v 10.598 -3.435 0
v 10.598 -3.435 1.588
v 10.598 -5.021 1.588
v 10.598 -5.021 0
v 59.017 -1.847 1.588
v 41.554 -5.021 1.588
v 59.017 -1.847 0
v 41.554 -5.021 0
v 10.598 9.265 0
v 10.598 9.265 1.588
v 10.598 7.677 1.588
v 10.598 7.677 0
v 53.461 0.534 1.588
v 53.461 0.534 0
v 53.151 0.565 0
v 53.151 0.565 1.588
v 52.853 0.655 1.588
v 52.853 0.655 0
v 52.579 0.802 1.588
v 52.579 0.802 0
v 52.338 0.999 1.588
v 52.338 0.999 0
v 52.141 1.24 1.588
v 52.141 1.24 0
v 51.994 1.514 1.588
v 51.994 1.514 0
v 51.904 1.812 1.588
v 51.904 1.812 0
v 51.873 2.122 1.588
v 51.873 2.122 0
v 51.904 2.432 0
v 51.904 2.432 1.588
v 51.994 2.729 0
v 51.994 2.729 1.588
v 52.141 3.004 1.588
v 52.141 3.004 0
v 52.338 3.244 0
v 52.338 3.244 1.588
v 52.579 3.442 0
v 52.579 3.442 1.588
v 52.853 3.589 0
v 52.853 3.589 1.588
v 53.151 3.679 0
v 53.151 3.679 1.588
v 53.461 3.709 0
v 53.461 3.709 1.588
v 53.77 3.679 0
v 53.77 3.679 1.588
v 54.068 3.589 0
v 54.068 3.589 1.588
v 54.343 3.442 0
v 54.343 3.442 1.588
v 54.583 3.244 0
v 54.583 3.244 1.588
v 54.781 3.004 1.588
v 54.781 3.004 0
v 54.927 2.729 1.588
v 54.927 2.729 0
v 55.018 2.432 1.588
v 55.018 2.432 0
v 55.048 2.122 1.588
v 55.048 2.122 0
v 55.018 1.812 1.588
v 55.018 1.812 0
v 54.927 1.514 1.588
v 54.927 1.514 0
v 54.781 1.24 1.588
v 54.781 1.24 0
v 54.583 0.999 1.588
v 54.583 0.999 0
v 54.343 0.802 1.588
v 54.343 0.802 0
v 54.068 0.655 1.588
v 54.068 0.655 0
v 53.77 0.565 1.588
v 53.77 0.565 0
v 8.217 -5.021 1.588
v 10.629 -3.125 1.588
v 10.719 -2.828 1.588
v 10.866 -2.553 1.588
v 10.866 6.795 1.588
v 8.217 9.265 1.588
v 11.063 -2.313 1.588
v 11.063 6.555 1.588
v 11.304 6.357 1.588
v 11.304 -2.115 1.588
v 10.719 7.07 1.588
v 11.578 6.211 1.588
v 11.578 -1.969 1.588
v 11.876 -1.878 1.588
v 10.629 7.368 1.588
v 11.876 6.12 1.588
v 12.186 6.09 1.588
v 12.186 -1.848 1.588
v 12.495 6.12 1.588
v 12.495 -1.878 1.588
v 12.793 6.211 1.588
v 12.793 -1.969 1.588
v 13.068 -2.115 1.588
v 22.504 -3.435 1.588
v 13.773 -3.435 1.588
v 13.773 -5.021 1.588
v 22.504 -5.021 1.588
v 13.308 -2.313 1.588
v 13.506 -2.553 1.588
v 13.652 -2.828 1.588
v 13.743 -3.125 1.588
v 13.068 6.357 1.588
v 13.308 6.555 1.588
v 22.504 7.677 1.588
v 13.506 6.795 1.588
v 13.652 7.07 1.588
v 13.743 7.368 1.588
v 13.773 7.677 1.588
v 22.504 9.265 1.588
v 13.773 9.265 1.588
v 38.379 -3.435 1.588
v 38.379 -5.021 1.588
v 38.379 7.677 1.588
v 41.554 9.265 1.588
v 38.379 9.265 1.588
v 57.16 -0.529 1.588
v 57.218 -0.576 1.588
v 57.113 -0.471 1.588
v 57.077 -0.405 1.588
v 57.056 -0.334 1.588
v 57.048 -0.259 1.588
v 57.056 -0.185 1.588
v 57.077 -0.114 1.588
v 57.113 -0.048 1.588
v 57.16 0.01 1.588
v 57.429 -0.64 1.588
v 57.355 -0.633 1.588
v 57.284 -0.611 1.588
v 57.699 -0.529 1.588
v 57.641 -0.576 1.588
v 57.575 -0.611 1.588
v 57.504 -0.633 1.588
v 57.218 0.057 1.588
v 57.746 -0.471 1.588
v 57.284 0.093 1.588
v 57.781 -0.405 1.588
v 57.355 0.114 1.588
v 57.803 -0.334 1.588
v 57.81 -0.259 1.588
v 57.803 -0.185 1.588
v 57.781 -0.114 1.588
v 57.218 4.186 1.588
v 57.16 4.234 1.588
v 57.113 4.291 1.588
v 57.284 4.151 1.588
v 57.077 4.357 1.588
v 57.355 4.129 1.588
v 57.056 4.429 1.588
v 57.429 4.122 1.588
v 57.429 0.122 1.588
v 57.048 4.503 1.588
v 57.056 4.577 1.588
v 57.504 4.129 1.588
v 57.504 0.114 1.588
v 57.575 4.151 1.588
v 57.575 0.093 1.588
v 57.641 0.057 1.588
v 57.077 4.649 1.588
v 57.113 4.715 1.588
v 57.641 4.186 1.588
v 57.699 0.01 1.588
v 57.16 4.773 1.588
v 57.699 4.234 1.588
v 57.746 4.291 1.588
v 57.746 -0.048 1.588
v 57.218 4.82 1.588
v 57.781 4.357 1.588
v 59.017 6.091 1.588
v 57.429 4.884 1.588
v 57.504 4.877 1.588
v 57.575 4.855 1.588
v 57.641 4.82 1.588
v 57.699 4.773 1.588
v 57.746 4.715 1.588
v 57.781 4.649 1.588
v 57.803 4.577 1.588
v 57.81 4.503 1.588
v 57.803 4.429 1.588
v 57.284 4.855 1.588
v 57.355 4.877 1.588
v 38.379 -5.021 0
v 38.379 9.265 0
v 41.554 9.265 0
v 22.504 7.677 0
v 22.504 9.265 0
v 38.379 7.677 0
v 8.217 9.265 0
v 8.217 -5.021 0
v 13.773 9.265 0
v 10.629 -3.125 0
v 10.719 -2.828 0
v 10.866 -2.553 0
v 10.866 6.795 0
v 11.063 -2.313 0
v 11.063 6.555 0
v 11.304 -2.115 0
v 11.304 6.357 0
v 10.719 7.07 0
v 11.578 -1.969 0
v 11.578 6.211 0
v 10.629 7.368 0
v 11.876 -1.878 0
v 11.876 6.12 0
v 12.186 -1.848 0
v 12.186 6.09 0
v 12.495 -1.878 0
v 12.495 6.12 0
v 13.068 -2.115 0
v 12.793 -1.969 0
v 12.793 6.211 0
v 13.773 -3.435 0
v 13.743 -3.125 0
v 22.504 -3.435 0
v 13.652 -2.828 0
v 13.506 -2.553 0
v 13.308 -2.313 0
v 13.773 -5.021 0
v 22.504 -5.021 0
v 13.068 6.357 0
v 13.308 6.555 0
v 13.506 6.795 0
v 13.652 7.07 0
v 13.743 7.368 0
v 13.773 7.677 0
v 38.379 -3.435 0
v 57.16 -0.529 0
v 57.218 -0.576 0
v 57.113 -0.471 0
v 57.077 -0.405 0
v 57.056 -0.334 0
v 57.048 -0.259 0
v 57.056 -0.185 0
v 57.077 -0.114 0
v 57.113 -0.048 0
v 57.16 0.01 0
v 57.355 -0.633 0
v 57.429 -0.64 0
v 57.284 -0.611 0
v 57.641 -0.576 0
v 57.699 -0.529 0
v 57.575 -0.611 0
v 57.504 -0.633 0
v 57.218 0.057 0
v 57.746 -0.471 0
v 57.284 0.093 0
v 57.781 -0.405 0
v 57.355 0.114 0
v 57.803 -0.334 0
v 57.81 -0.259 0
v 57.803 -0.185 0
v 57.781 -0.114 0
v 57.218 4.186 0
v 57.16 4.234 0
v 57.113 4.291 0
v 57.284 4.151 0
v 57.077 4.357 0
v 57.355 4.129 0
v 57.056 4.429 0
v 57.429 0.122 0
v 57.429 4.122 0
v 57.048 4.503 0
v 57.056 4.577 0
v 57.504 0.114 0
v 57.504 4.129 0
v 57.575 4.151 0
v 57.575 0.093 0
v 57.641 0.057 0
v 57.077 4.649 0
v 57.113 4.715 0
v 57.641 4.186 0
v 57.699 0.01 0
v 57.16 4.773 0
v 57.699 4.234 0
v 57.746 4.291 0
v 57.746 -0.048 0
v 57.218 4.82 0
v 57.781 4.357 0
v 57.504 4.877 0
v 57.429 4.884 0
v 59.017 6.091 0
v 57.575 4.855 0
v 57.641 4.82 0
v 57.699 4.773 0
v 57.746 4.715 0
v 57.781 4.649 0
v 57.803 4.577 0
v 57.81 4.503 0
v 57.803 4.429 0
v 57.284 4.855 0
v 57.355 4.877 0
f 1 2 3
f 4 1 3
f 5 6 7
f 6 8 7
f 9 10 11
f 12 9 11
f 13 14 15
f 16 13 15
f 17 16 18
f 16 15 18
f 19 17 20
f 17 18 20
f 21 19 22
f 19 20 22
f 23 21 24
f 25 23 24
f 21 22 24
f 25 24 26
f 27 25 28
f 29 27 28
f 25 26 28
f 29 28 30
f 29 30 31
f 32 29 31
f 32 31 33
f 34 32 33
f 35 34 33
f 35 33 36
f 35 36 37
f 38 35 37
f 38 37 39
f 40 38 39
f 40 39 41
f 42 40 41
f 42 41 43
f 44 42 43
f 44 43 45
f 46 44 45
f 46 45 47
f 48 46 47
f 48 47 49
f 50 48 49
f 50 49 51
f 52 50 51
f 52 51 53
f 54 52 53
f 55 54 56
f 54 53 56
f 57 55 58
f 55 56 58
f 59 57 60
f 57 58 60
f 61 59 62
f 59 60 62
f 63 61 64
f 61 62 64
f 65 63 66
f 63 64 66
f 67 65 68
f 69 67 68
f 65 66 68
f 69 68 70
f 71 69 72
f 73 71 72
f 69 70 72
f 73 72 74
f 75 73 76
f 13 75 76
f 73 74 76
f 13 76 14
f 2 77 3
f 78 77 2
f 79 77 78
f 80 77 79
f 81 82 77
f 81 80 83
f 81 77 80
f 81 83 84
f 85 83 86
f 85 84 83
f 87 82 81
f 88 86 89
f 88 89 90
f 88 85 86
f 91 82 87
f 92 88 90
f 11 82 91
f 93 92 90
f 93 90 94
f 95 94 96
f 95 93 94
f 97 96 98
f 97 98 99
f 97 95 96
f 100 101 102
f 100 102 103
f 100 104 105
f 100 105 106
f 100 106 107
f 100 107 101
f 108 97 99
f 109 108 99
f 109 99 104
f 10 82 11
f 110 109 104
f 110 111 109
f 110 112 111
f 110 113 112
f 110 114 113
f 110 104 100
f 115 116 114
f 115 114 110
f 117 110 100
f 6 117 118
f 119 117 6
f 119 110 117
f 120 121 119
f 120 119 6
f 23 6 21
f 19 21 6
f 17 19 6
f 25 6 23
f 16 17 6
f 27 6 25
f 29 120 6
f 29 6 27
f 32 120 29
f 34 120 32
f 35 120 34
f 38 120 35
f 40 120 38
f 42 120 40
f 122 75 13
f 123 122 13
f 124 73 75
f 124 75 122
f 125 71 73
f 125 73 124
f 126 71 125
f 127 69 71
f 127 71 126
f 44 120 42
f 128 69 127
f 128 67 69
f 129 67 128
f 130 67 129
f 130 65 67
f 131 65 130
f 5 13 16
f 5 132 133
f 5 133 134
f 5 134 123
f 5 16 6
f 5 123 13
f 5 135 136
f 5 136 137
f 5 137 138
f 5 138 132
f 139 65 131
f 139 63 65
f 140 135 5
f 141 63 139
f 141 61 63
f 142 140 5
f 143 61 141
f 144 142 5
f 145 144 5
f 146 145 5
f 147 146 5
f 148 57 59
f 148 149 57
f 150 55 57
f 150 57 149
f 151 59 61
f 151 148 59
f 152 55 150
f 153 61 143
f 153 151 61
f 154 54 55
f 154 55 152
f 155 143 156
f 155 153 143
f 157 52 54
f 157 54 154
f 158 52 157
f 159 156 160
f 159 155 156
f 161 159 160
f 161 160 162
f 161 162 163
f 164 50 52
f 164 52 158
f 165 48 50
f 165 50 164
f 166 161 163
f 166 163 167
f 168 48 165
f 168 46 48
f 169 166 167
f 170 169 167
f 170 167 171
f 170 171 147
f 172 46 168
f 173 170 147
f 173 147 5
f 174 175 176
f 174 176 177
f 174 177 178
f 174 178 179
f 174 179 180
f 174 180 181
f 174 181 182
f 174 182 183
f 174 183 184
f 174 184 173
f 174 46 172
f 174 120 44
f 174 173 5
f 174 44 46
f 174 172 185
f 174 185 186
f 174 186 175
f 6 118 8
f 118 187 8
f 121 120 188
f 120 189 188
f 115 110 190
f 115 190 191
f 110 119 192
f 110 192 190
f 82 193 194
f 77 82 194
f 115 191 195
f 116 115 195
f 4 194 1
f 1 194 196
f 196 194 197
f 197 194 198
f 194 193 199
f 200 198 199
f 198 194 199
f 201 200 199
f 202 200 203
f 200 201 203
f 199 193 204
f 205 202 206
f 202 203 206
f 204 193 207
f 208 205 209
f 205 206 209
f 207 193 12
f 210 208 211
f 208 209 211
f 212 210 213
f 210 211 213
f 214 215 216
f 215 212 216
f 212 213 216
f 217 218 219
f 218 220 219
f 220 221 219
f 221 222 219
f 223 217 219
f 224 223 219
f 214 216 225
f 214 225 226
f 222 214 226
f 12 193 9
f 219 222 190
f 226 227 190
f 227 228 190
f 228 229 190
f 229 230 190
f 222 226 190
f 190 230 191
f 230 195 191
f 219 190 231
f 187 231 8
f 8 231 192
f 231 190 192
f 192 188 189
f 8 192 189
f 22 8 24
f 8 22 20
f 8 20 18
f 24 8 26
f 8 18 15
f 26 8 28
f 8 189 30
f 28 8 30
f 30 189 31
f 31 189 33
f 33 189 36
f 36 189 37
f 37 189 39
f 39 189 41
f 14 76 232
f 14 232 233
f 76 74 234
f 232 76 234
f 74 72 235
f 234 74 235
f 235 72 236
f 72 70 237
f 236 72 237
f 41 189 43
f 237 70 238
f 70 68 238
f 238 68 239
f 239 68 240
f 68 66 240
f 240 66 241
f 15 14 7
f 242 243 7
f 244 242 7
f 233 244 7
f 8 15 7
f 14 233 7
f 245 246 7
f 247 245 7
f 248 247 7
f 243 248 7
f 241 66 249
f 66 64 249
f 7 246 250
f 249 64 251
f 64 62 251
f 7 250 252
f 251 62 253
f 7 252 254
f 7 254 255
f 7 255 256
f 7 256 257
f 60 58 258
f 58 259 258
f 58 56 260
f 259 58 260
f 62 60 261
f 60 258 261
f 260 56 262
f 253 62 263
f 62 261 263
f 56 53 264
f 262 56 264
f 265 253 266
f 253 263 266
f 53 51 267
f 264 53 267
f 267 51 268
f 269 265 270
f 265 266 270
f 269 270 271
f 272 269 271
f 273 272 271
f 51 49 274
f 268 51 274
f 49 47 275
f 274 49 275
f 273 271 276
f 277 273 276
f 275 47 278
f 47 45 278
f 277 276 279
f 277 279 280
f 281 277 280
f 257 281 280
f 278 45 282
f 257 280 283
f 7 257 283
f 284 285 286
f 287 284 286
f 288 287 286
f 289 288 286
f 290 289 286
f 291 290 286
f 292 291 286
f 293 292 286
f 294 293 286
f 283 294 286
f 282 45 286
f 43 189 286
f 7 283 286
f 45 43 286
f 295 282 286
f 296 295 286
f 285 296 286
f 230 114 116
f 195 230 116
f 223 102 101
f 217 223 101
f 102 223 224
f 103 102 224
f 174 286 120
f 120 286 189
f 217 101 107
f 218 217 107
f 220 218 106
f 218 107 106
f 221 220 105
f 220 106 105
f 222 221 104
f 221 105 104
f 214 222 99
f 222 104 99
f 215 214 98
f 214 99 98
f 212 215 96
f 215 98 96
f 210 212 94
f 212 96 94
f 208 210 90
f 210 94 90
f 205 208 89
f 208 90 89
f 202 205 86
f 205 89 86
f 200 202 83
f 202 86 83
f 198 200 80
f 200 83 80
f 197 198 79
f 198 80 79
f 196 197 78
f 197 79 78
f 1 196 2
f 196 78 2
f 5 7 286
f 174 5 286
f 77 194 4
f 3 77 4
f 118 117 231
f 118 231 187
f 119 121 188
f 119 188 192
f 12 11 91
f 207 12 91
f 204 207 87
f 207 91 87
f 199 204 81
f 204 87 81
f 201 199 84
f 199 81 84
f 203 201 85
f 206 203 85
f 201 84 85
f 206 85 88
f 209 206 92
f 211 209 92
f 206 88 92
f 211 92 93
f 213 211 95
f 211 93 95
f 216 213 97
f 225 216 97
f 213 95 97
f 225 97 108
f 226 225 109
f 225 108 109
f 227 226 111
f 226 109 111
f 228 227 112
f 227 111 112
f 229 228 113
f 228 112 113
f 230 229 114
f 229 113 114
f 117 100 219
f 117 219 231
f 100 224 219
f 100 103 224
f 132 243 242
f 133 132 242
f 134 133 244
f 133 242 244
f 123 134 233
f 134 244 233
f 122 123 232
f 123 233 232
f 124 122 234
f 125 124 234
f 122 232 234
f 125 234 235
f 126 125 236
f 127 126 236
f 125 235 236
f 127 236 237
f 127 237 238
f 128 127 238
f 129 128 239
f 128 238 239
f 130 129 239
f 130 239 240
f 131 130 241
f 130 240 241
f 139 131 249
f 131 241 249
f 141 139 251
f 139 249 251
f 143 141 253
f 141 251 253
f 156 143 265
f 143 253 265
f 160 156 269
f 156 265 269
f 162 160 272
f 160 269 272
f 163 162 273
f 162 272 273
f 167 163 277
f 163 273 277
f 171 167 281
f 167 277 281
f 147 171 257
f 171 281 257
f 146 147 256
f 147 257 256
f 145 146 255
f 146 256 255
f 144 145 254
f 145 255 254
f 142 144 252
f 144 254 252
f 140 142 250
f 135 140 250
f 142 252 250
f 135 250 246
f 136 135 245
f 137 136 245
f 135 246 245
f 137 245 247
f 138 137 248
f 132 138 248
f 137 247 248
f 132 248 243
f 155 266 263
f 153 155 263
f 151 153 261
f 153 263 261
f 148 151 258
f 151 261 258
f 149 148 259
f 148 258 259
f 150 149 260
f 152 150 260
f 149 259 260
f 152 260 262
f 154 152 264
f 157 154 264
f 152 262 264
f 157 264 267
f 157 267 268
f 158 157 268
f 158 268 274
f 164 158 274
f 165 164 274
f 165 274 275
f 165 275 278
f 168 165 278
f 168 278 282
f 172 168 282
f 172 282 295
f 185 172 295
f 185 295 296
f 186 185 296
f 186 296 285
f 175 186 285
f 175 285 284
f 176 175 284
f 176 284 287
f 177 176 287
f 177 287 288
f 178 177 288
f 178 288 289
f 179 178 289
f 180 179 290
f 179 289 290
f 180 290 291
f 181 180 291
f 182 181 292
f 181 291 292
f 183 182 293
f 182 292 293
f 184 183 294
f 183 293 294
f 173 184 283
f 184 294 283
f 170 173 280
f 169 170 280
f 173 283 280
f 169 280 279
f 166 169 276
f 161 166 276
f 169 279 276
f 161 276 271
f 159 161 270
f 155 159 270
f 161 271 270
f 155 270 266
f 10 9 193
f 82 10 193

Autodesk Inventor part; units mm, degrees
ref_plane "YZ Plane" through (0, 0, 0) normal (1, 0, 0) x (0, 1, 0)
ref_plane "XZ Plane" through (0, 0, 0) normal (0, 1, 0) x (-1, 0, 0)
ref_plane "XY Plane" through (0, 0, 0) normal (0, 0, 1) x (1, 0, 0)
sketch "Sketch1" plane through (0, 0, 0) normal (0, 0, 1) x (1, 0, 0)
  line L0 (8.2169, 9.2649) -> (8.2169, -5.0211)
  line L1 (8.2169, -5.0211) -> (41.5544, -5.0211)
  line L2 (41.5544, -5.0211) -> (59.0169, -1.8469)
  line L3 (59.0169, -1.8469) -> (59.0169, 6.0906)
  line L4 (59.0169, 6.0906) -> (41.5544, 9.2649)
  line L5 (41.5544, 9.2649) -> (8.2169, 9.2649)
  line L6 (59.0169, 2.1219) -> (8.2169, 2.1219) construction
  line L7 (3.1369, 0) -> (74.2569, 0) projected
  line L8 (0, 13.5507) -> (0, -6.4497) projected
  dimension "d1" = 33.3375
  dimension "d2" = 50.8
  dimension "d3" = 7.9375
  dimension "d92" = 7.143
  dimension "d93" = 2.1218
  dimension "d94" = 8.2169
extrude "Extrusion1" add sketch "Sketch1" along normal blind 1.5875
sketch "Sketch12" plane through (0, 0, 1.5875) normal (0, 0, 1) x (1, 0, 0)
  line L0 (8.2169, 9.2649) -> (41.5544, 9.2649) projected
  line L1 (8.2169, -5.0211) -> (8.2169, 9.2649) projected
  line L2 (22.5044, 9.2649) -> (38.3794, 9.2649)
  line L3 (38.3794, 9.2649) -> (38.3794, 7.6774)
  line L4 (38.3794, 7.6774) -> (22.5044, 7.6774)
  line L5 (22.5044, 7.6774) -> (22.5044, 9.2649)
  dimension "d63" = 15.875
  dimension "d64" = 1.5875
  dimension "d65" = 14.2875
extrude "Extrusion12" cut sketch "Sketch12" against normal through all
sketch "Sketch13" plane through (0, 0, 1.5875) normal (0, 0, 1) x (1, 0, 0)
  line L0 (8.2169, 9.2649) -> (22.5044, 9.2649) projected
  line L1 (38.3794, 7.6774) -> (22.5044, 7.6774) projected
  line L2 (10.5981, 9.2649) -> (10.5981, 7.6774)
  arc A0 (10.5981, 7.6774) -> (13.7731, 7.6774) centre (12.1856, 7.6774) ccw
  line L3 (13.7731, 7.6774) -> (13.7731, 9.2649)
  line L4 (22.5044, 7.6774) -> (22.5044, 9.2649) projected
  line L5 (8.2169, -5.0211) -> (8.2169, 9.2649) projected
  line L6 (41.5544, -5.0211) -> (8.2169, -5.0211) projected
  line L7 (59.0169, -1.8469) -> (41.5544, -5.0211) projected
  line L8 (59.0169, 6.0906) -> (59.0169, -1.8469) projected
  line L9 (41.5544, 9.2649) -> (59.0169, 6.0906) projected
  line L10 (38.3794, 9.2649) -> (41.5544, 9.2649) projected
  line L11 (38.3794, 9.2649) -> (38.3794, 7.6774) projected
  dimension "d68" = 1.5875
  dimension "d69" = 1.5875
  dimension "d70" = 3.9688
extrude "Extrusion13" cut sketch "Sketch13" against normal blind 25.4 contours L0 L3 A0 L2
ref_plane "Work Plane5" through (22.5044, 2.1211, 1.5875) normal (0, 1, 0) x (1, 0, 0)
mirror "Mirror2" about plane through (22.5044, 2.1211, 1.5875) normal (0, 1, 0) of "Extrusion12", "Extrusion13"
sketch "Sketch14" plane through (0, 0, 1.5875) normal (0, 0, 1) x (1, 0, 0)
  line L0 (3.1369, 2.1211) -> (74.2569, 2.1211) projected
  line L1 (13.7731, 9.2649) -> (22.5044, 9.2649) projected
  line L2 (8.2169, -5.0211) -> (8.2169, 9.2649) projected
  point P0 (53.4606, 2.1219)
  dimension "d95" = 45.2437
  dimension "d96" = 7.143
hole "Hole1" at (53.4606, 2.1219, 1.5875) direction (0, 0, -1) diameter 3.175 end through all
sketch "Sketch15" plane through (0, 0, 1.5875) normal (0, 0, 1) x (1, 0, 0)
  line L0 (10.5981, -5.0211) -> (10.5981, -3.4351) projected
  line L1 (59.0169, 6.0906) -> (57.4294, 4.5031)
  line L2 (57.4294, 4.5031) -> (57.4294, -0.2594)
  line L3 (57.4294, -0.2594) -> (59.0169, -1.8469)
  dimension "d82" = 4.7625
  dimension "d84" = 1.5875
hole "Hole2" at (57.4294, 4.5031, 1.5875) at (57.4294, -0.2594, 1.5875) direction (0, 0, -1) diameter 0.762 end through all
equation "\"d96\" = d92"
properties part number "pcb"
